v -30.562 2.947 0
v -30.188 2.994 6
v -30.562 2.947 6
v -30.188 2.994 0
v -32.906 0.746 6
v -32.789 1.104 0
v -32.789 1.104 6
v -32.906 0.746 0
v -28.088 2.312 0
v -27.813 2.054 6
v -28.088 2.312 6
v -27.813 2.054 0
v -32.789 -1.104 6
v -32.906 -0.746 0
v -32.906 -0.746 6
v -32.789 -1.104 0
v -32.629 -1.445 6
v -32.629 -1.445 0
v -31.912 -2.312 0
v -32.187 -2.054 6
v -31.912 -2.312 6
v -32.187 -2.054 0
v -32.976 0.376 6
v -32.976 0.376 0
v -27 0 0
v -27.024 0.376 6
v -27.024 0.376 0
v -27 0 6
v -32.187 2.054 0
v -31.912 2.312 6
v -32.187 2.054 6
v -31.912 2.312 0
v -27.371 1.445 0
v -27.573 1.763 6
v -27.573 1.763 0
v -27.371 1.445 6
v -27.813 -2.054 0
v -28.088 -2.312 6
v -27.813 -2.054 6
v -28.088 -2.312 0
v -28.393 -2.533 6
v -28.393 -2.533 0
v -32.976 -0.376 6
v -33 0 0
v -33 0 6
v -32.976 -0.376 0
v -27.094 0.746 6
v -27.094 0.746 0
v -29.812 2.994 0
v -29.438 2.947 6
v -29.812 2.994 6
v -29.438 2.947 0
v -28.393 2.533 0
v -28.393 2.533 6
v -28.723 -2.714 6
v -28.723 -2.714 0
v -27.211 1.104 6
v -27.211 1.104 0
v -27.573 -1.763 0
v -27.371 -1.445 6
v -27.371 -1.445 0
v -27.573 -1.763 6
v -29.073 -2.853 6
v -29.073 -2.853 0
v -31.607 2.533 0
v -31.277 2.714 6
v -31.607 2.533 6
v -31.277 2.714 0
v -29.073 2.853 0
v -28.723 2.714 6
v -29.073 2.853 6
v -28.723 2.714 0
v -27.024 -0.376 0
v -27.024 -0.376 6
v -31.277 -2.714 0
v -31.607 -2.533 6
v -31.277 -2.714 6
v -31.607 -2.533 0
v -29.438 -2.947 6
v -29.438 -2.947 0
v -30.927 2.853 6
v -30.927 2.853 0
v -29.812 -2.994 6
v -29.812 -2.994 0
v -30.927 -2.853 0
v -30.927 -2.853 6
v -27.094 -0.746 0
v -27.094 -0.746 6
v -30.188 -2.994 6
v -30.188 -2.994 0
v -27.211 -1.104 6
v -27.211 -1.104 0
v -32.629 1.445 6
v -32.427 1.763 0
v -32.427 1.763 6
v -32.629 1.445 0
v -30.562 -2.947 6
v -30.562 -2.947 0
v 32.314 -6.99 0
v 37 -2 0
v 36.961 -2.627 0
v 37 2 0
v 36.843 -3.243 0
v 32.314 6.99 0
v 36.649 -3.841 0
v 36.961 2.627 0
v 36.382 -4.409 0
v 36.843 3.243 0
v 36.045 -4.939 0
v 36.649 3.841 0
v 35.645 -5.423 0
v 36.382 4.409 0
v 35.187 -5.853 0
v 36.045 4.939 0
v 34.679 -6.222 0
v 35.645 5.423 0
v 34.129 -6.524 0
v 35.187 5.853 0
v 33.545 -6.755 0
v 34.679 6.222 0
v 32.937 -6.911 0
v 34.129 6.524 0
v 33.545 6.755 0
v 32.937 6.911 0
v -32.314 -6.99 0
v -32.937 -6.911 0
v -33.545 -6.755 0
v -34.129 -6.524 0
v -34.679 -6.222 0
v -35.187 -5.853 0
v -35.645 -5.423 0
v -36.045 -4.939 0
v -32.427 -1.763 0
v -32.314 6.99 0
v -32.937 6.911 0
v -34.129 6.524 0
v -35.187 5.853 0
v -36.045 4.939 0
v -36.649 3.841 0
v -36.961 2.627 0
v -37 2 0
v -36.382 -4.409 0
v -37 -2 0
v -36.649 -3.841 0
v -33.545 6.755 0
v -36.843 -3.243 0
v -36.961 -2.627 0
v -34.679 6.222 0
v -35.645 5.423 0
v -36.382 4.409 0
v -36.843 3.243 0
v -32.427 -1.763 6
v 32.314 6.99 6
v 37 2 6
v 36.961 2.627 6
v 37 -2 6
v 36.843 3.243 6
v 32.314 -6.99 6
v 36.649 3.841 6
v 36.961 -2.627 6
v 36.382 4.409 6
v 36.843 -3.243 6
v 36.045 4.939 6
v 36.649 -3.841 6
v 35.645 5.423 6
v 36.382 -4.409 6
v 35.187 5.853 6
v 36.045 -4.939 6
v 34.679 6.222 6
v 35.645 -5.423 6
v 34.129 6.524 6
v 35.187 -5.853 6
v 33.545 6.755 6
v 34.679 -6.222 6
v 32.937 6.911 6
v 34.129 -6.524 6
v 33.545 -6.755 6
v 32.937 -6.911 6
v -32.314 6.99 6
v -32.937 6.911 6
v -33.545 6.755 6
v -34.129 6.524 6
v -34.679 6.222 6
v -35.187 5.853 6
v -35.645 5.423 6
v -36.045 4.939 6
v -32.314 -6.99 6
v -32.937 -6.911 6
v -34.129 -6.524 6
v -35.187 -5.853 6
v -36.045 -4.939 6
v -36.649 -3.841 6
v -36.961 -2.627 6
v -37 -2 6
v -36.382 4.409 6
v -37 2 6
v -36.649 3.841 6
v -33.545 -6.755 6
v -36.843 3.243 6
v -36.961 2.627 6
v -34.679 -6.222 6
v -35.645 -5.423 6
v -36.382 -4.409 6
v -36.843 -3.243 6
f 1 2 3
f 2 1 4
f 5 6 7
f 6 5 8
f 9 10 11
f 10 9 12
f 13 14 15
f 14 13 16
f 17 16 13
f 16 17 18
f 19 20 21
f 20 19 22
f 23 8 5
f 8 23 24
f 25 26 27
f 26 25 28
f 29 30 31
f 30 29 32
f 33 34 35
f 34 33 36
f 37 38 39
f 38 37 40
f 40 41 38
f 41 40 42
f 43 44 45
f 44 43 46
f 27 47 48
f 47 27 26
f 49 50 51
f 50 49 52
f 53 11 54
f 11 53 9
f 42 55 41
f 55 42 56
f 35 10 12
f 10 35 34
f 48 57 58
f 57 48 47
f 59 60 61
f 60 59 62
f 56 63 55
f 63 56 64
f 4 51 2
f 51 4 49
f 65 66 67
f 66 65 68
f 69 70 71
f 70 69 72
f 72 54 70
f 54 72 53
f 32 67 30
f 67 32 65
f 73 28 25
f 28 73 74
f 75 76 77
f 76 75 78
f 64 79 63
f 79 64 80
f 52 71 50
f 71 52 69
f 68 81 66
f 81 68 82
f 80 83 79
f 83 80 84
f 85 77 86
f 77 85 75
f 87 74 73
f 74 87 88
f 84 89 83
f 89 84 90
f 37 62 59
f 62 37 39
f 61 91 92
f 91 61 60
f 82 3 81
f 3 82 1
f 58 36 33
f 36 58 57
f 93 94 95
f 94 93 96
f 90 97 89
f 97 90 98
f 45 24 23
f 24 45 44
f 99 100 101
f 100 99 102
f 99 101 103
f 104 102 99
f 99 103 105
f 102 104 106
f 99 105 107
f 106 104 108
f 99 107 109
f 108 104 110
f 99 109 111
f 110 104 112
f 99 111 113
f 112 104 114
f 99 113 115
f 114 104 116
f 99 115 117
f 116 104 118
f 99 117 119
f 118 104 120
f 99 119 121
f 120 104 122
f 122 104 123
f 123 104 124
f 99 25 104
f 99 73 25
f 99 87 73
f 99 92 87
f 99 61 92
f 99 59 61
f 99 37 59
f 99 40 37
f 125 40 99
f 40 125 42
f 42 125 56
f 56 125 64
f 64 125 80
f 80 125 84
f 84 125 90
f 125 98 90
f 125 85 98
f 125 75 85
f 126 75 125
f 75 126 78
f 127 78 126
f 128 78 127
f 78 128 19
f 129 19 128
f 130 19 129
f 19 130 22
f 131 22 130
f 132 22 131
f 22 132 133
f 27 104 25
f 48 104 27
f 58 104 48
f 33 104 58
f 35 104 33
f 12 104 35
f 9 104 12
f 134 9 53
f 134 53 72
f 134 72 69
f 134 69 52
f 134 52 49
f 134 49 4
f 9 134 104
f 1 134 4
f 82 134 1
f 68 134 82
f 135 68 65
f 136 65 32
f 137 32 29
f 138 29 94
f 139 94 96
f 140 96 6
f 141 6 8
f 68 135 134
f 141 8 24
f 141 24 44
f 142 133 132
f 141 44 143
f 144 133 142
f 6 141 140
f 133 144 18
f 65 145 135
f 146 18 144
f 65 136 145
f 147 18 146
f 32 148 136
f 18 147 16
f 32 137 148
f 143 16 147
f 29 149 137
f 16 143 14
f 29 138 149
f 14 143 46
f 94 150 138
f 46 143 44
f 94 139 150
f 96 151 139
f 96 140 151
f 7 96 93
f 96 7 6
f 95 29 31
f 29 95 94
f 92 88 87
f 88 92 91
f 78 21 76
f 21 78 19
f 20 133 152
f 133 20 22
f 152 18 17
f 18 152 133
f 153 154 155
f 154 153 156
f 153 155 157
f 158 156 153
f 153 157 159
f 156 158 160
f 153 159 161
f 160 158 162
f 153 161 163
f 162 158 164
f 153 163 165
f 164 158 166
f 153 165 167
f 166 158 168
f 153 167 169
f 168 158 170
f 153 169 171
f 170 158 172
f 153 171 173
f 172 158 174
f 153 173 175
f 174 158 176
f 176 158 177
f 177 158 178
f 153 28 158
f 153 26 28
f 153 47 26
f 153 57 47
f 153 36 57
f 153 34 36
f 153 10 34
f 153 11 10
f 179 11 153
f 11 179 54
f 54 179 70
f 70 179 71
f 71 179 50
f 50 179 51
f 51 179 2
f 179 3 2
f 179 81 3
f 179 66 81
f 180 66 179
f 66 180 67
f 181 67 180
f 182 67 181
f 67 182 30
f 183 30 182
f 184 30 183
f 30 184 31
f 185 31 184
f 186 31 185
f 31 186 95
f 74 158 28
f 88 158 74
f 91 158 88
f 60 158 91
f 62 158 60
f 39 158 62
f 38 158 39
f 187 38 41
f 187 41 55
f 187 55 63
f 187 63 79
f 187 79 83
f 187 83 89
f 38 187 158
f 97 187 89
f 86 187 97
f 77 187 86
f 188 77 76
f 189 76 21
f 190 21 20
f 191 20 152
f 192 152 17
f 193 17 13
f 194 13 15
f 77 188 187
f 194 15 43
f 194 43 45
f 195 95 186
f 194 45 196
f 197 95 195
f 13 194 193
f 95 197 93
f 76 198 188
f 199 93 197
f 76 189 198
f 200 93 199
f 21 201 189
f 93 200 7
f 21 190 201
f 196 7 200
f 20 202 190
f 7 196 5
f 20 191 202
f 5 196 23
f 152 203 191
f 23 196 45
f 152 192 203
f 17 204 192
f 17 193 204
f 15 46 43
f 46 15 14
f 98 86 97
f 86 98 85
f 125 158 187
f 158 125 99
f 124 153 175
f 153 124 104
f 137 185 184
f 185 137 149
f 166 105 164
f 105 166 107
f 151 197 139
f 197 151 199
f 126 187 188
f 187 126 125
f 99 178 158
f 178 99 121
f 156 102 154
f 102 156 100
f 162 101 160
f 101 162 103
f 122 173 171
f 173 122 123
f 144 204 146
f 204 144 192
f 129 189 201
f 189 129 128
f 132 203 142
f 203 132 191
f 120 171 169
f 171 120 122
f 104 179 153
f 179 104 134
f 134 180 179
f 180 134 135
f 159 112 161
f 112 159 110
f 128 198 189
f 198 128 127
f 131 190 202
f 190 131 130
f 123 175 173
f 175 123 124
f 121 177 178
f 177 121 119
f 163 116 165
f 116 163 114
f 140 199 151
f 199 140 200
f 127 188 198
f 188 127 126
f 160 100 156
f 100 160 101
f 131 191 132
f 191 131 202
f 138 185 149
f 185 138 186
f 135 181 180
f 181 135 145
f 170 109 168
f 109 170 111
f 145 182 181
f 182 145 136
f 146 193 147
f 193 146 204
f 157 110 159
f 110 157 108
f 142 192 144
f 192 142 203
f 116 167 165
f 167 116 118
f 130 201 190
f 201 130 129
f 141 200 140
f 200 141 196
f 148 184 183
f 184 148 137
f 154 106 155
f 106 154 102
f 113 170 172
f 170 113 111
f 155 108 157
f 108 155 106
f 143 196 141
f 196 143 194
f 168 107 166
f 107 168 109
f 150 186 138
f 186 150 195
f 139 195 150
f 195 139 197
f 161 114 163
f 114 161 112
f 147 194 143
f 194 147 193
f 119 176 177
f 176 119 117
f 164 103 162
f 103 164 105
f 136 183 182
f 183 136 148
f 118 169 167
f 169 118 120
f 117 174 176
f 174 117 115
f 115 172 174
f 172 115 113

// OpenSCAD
$fn = 50;


difference() {
	union() {
		hull() {
			translate(v = [-32.0000000000, 2.0000000000, 0]) {
				cylinder(h = 6, r = 5);
			}
			translate(v = [32.0000000000, 2.0000000000, 0]) {
				cylinder(h = 6, r = 5);
			}
			translate(v = [-32.0000000000, -2.0000000000, 0]) {
				cylinder(h = 6, r = 5);
			}
			translate(v = [32.0000000000, -2.0000000000, 0]) {
				cylinder(h = 6, r = 5);
			}
		}
	}
	union() {
		translate(v = [-30.0000000000, 0.0000000000, 0]) {
			cylinder(h = 6, r = 3.0000000000);
		}
		translate(v = [-30.0000000000, 0.0000000000, 0]) {
			cylinder(h = 6, r = 1.5000000000);
		}
		translate(v = [-30.0000000000, 0.0000000000, 0]) {
			cylinder(h = 6, r = 1.5000000000);
		}
		translate(v = [-30.0000000000, 0.0000000000, 0]) {
			cylinder(h = 6, r = 1.5000000000);
		}
	}
}
